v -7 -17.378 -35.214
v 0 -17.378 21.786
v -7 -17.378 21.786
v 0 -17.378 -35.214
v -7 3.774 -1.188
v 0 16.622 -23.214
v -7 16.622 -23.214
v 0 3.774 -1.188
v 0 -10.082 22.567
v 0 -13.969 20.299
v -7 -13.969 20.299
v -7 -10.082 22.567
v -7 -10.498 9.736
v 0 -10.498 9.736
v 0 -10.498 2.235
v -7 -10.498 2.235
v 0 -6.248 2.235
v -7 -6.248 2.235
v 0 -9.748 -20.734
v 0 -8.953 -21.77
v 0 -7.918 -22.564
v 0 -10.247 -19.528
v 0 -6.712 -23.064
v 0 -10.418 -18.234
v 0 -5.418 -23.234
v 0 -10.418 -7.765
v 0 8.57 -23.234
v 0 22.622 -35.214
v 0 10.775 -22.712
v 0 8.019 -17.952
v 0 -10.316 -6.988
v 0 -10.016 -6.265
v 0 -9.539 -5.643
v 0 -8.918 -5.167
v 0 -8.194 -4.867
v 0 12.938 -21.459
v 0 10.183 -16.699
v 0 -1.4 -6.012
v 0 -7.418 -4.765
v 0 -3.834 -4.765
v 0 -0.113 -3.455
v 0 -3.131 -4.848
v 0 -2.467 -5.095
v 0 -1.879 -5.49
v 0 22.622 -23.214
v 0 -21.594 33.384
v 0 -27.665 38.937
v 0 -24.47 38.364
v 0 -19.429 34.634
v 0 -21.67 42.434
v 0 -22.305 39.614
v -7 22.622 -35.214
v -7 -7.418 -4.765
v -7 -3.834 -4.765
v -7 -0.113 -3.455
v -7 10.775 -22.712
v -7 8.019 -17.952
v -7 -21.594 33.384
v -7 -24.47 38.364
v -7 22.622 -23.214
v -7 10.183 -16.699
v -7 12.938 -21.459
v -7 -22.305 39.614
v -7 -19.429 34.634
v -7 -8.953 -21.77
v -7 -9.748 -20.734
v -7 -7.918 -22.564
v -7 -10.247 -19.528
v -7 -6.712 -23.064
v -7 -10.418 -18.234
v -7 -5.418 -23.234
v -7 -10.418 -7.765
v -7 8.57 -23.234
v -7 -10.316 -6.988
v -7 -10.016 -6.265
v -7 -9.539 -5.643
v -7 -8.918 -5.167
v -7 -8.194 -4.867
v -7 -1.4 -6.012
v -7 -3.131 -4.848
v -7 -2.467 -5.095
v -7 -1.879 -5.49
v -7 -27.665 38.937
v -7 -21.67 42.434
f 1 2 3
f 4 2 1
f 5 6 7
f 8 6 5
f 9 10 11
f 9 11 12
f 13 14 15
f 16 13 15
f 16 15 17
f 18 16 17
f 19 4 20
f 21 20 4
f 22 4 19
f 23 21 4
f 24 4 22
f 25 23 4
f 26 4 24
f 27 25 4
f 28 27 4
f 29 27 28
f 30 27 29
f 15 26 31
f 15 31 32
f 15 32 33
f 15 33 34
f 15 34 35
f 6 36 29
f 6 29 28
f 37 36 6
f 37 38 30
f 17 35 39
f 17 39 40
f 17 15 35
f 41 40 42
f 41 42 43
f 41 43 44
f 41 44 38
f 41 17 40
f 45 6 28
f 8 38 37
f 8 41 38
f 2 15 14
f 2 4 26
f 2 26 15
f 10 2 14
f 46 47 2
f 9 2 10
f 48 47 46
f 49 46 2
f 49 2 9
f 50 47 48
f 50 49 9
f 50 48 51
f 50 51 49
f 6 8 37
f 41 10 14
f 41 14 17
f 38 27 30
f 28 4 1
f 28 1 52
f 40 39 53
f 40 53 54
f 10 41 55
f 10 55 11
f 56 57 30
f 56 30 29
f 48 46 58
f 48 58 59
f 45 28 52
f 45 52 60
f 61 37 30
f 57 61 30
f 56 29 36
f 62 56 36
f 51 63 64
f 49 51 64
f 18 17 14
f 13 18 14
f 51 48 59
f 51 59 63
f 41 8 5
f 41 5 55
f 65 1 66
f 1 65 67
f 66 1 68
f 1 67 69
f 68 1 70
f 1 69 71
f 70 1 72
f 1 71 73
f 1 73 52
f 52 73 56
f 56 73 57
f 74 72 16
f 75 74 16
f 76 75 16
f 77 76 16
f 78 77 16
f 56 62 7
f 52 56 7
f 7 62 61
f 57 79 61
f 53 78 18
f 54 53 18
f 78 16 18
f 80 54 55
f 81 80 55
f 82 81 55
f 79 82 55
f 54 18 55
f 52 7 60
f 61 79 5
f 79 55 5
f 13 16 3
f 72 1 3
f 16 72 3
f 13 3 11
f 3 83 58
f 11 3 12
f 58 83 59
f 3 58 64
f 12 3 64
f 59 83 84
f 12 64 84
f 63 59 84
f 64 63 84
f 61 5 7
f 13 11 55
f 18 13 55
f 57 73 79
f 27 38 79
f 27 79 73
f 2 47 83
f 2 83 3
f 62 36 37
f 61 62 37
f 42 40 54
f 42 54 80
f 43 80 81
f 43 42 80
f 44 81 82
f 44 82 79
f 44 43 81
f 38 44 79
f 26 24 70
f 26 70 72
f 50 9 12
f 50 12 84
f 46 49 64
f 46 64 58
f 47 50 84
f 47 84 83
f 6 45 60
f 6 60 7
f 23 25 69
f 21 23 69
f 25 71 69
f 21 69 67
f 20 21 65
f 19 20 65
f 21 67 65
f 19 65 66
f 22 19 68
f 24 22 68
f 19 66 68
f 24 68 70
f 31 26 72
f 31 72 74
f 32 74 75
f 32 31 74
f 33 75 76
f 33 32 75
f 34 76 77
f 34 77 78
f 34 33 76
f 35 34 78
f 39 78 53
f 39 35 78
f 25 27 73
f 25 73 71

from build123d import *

# Parameters (mm, degrees)
BOSS_EXTRUDE1_DEPTH = 7
FILLET1_R           = 3
FILLET2_R           = 5


with BuildPart() as part:
    # Sketch1 → Boss-Extrude1 (new body)
    with BuildSketch(Plane(origin=(0, 0, 0), x_dir=(0, 0, -1), z_dir=(1, 0, 0))):
        Polygon((-21.785617828, -17.377868865), (35.214382172, -17.377868865), (35.214382172, 22.622131135), (23.214382172, 22.622131135), (23.214382172, 16.622131135), (1.187686697, 3.773991719), (3.455005417, -0.113072189), (-20.299274017, -13.968908814), (-22.566592737, -10.081844907), (-42.433808264, -21.670362811), (-38.937098948, -27.665079148), align=None)
        Polygon((23.234116709, 8.569586546), (23.234116709, -10.417868865), (4.764740561, -10.417868865), (4.764740561, -1.399885987), (6.011600394, -1.399885987), align=None, mode=Mode.SUBTRACT)
        Polygon((-39.613886954, -22.304550046), (-34.634489281, -19.42911985), (-33.384302239, -21.59407536), (-38.363699913, -24.469505556), align=None, mode=Mode.SUBTRACT)
        Polygon((-9.735540794, -10.497868865), (-2.235259439, -10.497868865), (-2.235259439, -6.248372162), align=None, mode=Mode.SUBTRACT)
        Polygon((16.699385829, 10.182861543), (17.951839541, 8.019216032), (22.7118599, 10.774614335), (21.459406188, 12.938259845), align=None, mode=Mode.SUBTRACT)
    extrude(amount=-BOSS_EXTRUDE1_DEPTH)

    # Fillet1
    # the kernel refuses this fillet: 3 mm, written as the material it adds along each edge
    with BuildSketch(Plane(origin=(0, -10.417868865, -4.764740561), x_dir=(0, 0, -1), z_dir=(-1, 0, 0))) as fillet1_piece_1:
        with BuildLine():
            CenterArc((FILLET1_R, -FILLET1_R), FILLET1_R, 90, 90)
            Line((0, -FILLET1_R), (-FILLET1_R * 0.02, -FILLET1_R))
            Line((-FILLET1_R * 0.02, -FILLET1_R), (-FILLET1_R * 0.02, FILLET1_R * 0.02))
            Line((-FILLET1_R * 0.02, FILLET1_R * 0.02), (FILLET1_R, FILLET1_R * 0.02))
            Line((FILLET1_R, FILLET1_R * 0.02), (FILLET1_R, 0))
        make_face()
    extrude(amount=7)
    with BuildSketch(Plane(origin=(0, -1.399885987, -4.764740561), x_dir=(0, -1, 0), z_dir=(-1, 0, 0))) as fillet1_piece_2:
        with BuildLine():
            CenterArc((2.434440295, -3), FILLET1_R, 90, 54.240794128)
            Line((0, -1.246859832), (-0.048688806, -1.211797029))
            ThreePointArc((-0.048688806, -1.211797029), (-0.06, -0.623429916), (-0.06, 0))
            Line((-0.06, 0), (0, 0.06))
            Line((0, 0.06), (2.434440295, 0.06))
            Line((2.434440295, 0.06), (2.434440295, 0))
        make_face()
    extrude(amount=7)

    # Fillet2
    fillet2_edges = [part.edges().sort_by_distance(p)[0] for p in [
        (-3.5, -10.417868865, -23.234116709),
    ]]
    fillet(fillet2_edges, radius=FILLET2_R)


solid = part.part
